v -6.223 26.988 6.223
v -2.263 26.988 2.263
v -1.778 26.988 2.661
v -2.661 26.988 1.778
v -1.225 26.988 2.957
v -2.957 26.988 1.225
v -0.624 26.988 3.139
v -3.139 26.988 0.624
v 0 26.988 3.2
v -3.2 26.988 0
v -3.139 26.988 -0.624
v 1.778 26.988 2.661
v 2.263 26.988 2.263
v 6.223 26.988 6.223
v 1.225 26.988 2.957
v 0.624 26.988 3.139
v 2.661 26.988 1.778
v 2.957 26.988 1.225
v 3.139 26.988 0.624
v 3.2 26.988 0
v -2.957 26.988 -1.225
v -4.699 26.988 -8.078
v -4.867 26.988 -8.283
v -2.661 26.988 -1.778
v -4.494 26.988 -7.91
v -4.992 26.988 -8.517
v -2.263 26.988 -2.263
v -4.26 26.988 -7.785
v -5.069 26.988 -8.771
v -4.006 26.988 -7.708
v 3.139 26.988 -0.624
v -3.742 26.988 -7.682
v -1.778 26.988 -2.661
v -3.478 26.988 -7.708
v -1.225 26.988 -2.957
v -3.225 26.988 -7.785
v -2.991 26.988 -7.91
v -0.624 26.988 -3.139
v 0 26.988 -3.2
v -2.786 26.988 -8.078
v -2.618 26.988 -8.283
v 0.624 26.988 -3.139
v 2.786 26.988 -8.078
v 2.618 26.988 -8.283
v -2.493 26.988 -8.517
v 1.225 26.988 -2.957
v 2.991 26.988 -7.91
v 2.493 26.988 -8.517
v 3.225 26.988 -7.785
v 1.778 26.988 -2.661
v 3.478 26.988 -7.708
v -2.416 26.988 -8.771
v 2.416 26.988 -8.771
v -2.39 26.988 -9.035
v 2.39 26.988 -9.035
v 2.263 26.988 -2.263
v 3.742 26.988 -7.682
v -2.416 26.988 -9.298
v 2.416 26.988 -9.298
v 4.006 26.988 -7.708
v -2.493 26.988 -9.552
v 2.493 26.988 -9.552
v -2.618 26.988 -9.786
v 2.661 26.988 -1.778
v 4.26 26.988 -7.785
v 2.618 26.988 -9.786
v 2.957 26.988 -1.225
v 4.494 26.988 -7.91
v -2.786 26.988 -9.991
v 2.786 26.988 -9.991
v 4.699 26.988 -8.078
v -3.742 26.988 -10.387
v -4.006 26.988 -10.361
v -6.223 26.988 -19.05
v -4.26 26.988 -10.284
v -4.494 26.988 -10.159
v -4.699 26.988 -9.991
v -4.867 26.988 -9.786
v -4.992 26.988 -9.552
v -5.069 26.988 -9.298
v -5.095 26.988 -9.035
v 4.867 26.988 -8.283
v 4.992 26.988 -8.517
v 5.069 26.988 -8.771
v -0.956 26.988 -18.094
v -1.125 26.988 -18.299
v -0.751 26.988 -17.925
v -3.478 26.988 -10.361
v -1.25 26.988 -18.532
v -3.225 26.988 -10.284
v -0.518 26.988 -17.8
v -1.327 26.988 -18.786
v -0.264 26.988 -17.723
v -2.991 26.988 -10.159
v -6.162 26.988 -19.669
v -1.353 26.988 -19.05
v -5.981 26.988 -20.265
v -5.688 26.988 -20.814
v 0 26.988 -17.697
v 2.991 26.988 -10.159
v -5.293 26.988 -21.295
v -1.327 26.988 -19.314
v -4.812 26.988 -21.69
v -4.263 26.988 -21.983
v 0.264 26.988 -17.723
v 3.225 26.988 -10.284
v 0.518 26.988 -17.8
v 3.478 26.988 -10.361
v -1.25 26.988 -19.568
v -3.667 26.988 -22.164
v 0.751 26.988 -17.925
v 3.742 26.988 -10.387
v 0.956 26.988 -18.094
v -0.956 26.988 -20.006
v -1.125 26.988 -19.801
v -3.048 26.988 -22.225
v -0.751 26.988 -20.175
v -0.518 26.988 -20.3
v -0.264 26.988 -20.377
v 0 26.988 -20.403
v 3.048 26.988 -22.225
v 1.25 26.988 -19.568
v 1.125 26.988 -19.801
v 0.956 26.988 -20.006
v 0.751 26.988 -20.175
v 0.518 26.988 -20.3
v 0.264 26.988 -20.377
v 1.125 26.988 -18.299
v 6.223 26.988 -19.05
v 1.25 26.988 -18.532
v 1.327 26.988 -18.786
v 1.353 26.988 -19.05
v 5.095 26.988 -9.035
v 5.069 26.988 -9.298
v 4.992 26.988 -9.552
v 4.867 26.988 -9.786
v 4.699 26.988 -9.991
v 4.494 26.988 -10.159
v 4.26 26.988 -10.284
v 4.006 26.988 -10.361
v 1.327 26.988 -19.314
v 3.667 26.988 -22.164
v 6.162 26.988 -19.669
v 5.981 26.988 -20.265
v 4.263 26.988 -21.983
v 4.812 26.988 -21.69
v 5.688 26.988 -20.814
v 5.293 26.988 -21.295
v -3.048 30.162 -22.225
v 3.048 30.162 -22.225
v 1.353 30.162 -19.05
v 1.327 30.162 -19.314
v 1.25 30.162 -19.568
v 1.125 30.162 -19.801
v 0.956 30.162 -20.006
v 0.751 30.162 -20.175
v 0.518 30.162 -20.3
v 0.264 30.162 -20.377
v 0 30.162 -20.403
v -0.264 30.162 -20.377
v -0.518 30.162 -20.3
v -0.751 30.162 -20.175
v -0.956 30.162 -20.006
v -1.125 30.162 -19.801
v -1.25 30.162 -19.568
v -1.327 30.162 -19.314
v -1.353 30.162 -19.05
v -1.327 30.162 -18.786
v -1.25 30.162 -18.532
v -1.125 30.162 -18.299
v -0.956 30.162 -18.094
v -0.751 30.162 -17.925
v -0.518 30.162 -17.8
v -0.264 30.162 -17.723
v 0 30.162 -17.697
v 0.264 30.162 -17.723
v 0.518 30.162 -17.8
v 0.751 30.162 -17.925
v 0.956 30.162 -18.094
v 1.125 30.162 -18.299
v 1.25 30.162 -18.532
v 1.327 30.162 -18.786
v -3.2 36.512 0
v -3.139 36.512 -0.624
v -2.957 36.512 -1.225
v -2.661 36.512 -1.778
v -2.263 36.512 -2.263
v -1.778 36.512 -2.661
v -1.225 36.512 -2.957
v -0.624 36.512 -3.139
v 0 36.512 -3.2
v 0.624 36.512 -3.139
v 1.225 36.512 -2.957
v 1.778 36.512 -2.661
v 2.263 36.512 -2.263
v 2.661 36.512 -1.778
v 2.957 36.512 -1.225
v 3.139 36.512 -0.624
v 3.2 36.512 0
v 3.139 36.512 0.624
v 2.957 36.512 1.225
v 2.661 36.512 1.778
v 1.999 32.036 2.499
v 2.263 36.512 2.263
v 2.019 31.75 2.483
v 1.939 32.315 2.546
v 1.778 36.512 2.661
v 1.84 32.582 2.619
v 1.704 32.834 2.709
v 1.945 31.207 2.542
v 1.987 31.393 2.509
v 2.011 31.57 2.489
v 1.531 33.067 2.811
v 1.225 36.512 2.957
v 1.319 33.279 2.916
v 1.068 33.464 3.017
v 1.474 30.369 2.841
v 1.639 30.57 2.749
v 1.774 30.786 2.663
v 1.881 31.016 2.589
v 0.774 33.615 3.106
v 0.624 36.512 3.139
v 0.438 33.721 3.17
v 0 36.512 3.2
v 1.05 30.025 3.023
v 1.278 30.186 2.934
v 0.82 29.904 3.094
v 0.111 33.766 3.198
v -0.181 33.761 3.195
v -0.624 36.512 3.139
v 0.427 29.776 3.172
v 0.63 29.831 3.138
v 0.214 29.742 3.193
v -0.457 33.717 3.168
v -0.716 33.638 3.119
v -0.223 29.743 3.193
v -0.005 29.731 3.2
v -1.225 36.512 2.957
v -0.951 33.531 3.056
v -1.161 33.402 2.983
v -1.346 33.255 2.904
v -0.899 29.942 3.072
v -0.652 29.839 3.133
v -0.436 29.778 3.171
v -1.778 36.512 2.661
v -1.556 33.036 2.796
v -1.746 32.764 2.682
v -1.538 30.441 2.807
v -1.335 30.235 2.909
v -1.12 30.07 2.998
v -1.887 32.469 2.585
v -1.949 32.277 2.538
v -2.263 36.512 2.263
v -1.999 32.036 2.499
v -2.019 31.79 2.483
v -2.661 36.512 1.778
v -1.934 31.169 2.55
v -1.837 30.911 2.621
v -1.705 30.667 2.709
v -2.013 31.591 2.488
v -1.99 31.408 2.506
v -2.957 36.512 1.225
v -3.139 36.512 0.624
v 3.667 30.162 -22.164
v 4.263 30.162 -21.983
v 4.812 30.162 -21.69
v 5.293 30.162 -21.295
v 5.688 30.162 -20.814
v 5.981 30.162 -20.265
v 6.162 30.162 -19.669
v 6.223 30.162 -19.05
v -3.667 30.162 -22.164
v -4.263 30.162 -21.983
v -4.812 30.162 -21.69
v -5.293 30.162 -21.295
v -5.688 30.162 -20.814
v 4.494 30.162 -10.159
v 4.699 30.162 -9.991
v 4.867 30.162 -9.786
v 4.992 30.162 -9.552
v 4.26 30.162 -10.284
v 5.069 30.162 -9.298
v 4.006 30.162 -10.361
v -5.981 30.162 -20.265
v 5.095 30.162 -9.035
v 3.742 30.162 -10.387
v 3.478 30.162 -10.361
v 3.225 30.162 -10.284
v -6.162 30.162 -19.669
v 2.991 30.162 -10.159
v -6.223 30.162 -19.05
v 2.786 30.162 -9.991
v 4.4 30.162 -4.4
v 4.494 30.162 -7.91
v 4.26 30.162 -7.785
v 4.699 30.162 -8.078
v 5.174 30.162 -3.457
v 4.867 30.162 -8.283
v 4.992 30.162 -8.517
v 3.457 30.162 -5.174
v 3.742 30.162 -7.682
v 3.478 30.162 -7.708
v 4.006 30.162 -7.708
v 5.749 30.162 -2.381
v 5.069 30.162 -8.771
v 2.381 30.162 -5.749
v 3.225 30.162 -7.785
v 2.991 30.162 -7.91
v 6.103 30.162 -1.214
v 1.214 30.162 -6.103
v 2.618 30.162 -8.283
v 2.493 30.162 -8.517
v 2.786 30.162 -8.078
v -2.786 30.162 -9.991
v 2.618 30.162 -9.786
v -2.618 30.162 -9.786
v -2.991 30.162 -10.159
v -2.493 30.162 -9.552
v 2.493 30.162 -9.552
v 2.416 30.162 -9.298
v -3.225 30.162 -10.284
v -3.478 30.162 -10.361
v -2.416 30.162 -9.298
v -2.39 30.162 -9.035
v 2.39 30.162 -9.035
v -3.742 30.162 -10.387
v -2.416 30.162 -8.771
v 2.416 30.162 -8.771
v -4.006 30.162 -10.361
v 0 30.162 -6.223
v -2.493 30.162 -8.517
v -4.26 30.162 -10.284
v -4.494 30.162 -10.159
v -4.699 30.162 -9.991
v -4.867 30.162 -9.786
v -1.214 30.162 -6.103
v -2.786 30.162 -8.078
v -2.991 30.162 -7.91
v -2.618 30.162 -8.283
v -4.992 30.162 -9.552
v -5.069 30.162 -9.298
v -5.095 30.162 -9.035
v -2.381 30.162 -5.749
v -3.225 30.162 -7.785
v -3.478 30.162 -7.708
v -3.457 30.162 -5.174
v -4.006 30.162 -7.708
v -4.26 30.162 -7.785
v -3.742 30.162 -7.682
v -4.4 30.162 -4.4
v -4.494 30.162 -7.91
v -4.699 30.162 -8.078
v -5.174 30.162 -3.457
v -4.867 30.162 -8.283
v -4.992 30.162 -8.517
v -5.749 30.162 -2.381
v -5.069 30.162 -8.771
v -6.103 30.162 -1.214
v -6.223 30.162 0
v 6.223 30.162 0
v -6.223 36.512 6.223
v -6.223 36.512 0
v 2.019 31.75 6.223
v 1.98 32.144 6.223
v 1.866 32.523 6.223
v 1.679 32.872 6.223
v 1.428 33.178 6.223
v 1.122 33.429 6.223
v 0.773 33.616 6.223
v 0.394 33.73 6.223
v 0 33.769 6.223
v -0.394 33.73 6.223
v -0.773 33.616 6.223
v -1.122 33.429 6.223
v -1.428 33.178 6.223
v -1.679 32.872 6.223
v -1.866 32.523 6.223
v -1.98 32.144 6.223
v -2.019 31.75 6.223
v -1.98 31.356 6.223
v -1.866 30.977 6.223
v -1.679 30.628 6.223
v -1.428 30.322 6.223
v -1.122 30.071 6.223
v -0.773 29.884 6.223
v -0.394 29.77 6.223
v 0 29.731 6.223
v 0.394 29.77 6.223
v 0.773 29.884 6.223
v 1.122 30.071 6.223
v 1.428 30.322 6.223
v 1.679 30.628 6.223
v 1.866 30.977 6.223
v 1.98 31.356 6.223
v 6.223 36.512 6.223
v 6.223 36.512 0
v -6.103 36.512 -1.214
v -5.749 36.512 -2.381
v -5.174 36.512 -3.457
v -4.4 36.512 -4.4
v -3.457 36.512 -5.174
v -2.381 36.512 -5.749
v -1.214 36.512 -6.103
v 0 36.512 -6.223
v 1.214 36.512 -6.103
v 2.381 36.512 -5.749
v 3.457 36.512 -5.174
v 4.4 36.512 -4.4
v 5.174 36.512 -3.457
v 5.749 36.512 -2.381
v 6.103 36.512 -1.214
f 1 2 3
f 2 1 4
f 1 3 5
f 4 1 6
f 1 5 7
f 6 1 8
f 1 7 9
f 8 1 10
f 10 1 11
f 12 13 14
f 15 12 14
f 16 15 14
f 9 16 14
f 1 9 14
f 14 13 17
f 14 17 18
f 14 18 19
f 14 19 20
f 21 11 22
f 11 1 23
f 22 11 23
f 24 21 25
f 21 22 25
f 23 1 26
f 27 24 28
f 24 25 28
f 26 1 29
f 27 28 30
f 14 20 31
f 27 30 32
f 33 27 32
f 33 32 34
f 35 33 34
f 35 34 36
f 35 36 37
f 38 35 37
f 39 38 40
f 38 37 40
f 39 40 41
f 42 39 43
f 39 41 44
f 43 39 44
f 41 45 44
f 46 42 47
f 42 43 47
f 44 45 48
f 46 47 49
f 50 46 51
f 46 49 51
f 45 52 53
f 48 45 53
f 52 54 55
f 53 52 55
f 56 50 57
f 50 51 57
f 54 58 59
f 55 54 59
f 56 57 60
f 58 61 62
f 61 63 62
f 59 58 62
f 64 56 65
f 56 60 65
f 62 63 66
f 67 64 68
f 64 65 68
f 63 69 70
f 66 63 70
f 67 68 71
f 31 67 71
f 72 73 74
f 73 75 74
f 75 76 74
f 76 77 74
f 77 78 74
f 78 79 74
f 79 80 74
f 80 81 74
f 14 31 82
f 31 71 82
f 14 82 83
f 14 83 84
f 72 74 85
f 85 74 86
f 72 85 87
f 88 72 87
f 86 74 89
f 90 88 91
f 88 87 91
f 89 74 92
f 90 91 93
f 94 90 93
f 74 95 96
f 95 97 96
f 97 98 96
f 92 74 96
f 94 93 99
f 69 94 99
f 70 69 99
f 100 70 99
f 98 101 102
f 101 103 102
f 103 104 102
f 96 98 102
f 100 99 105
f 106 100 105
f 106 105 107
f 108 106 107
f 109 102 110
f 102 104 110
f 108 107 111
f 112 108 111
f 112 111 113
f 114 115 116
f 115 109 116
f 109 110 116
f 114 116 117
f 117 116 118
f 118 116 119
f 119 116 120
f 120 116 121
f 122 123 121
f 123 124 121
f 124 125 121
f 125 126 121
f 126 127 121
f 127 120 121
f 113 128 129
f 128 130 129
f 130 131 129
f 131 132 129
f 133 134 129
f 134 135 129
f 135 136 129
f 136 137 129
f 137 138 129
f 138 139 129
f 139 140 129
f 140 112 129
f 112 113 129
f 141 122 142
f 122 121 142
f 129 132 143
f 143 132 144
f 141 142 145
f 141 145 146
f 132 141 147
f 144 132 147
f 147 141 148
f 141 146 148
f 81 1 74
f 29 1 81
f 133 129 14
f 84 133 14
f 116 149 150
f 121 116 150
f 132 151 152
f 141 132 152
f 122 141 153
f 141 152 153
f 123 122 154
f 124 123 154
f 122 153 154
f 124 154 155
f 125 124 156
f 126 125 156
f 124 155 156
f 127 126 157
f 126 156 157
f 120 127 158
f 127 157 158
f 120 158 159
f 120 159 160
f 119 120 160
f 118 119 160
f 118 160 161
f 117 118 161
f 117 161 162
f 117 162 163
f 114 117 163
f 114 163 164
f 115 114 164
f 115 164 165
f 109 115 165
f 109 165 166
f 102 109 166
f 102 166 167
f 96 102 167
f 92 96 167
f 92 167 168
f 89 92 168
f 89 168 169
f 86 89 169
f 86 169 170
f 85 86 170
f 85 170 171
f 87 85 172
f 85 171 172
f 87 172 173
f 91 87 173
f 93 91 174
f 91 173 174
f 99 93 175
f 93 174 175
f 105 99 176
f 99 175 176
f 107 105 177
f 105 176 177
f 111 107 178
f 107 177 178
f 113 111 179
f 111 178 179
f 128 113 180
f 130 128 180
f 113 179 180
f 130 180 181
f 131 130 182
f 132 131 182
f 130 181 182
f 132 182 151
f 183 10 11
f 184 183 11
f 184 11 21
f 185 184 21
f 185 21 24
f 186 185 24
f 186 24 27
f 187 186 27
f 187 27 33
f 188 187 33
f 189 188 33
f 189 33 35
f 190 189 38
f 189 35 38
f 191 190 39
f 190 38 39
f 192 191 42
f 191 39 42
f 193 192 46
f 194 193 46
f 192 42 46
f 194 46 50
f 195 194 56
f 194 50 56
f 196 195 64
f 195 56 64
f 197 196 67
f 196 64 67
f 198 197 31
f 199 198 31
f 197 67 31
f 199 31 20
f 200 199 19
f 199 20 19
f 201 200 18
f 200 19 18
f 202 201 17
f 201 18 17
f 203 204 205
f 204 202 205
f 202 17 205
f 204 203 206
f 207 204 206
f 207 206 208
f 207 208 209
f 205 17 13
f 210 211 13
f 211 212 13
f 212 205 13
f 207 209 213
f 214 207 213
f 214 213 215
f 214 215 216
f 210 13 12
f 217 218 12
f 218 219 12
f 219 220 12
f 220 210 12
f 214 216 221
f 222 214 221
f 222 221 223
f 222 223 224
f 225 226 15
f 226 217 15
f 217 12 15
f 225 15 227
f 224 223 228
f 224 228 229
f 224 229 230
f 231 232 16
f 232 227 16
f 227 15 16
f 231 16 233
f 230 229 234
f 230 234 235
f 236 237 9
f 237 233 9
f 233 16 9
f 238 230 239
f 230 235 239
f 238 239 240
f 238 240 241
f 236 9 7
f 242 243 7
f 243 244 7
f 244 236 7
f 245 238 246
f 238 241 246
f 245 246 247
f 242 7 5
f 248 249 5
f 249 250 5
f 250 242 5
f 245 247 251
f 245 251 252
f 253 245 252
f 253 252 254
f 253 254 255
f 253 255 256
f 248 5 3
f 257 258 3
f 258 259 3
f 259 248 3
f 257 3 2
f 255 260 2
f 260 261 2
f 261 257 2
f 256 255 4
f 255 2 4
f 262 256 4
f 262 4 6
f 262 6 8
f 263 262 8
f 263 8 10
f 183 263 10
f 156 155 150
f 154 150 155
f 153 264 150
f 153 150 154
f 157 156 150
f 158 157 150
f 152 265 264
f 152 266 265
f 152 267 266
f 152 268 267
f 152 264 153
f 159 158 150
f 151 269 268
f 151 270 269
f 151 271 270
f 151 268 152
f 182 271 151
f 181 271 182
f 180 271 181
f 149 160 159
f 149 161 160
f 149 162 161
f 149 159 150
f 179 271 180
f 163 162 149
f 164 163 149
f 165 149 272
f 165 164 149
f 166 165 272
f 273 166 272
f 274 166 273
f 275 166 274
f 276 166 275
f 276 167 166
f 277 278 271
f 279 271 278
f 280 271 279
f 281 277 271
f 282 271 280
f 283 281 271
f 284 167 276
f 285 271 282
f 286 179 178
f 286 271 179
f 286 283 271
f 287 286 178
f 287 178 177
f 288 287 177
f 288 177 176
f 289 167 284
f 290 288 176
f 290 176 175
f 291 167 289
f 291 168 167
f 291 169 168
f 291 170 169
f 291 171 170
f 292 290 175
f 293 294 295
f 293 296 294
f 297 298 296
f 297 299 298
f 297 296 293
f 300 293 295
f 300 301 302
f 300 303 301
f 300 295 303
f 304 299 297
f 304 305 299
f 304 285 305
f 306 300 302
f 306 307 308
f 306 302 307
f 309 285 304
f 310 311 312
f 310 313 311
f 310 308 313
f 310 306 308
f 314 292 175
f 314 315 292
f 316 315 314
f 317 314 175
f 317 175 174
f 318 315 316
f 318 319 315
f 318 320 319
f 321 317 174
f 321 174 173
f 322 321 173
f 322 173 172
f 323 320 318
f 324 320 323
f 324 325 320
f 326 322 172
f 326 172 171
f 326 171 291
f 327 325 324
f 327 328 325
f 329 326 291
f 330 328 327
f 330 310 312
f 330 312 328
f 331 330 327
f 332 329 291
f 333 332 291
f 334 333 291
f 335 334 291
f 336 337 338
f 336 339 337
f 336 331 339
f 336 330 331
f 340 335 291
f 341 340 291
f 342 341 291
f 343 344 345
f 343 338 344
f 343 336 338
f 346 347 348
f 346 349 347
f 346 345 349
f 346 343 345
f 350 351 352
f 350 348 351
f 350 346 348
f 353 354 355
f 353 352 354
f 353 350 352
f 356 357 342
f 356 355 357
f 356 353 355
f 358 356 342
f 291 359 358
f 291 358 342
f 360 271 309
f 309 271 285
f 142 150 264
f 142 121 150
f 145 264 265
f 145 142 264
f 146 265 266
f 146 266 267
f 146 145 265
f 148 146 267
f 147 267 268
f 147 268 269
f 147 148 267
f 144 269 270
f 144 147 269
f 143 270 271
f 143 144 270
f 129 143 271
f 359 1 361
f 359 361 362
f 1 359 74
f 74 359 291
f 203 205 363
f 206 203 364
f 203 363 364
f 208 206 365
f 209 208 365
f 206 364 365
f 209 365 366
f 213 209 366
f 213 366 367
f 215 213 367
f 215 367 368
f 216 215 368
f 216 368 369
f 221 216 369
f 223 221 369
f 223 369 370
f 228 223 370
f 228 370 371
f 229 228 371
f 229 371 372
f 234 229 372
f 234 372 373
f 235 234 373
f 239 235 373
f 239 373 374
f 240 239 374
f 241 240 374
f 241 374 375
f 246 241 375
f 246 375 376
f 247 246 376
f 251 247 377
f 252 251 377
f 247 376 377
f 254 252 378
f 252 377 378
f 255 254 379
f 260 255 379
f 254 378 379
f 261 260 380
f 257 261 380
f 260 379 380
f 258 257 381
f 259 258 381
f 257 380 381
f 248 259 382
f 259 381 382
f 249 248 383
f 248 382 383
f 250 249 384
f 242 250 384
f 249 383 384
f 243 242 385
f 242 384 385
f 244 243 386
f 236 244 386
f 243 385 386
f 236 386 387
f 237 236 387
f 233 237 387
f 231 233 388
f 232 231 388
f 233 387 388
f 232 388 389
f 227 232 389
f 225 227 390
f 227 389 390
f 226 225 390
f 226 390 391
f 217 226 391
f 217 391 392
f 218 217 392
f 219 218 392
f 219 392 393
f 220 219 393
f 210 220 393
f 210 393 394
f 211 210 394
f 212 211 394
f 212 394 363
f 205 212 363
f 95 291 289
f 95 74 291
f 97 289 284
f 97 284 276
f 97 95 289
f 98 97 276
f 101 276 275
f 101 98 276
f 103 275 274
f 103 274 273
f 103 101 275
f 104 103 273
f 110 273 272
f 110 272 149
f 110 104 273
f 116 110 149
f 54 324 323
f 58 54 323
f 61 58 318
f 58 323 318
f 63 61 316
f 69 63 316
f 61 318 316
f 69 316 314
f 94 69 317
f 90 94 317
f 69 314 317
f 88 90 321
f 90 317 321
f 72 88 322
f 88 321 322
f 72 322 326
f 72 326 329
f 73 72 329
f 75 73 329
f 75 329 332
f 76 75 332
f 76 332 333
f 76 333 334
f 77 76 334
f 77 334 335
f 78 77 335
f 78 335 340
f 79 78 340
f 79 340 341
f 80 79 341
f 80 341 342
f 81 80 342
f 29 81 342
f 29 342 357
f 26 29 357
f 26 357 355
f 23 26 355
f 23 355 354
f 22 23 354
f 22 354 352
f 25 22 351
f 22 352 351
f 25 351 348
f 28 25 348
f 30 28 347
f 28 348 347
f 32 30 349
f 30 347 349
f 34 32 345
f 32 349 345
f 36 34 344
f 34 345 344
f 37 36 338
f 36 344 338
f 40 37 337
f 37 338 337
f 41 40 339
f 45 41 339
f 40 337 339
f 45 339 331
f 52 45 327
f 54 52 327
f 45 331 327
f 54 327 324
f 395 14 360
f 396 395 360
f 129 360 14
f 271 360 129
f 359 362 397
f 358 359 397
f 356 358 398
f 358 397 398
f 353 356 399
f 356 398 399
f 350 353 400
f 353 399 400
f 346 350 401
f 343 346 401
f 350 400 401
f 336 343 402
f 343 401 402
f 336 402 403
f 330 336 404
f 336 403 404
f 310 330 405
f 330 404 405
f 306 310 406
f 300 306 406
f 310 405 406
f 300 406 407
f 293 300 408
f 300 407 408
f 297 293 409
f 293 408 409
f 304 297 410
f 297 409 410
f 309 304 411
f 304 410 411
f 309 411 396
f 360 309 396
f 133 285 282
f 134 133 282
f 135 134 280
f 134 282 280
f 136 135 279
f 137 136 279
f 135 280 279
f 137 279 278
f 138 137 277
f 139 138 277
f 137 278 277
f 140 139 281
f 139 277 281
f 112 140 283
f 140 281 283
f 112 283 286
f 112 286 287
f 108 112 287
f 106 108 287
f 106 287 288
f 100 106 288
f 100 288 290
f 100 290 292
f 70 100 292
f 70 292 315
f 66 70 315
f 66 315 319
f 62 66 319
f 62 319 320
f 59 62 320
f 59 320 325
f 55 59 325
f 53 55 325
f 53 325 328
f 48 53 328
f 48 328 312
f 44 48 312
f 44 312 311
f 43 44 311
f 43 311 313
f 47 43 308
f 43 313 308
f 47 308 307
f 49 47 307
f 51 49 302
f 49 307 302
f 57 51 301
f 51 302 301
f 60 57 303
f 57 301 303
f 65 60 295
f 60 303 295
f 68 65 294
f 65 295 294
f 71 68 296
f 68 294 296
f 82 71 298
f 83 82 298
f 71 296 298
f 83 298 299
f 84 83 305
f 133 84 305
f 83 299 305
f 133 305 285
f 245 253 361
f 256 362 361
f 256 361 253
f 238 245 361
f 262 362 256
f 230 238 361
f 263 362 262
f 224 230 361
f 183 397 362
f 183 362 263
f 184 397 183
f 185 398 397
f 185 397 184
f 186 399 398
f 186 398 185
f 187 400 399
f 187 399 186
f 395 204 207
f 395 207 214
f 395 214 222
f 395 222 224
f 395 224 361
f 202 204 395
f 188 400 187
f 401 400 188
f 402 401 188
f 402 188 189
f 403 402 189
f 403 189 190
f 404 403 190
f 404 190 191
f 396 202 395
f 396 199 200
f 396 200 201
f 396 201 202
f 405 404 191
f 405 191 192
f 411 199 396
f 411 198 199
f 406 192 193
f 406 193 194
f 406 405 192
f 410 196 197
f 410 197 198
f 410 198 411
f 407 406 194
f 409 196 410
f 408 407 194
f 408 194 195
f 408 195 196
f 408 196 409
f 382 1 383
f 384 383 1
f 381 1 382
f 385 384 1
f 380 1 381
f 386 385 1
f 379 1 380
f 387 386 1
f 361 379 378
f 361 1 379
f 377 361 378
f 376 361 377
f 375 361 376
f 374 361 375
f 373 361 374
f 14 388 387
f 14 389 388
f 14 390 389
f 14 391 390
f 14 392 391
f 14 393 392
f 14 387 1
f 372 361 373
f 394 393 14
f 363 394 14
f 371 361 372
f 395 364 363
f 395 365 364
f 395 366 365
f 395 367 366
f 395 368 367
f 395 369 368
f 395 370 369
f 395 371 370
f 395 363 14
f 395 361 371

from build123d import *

# Parameters (mm, degrees)
SKETCH_1_W                = 12.446
SKETCH_1_H                = 28.448
EXTRUDE_1_DEPTH           = 9.525
CUT_EXTRUDE_1_DEPTH       = 6.35
HOLE_WIZARD_M2_5_1_D      = 2.7051
HOLE_WIZARD_M2_5_1_DEPTH  = 9.525
HOLE_WIZARD_M6_1_D        = 6.4008
HOLE_WIZARD_M3_5_1_REACH  = 48.703
HOLE_WIZARD_M3_5_1_BORE_R = 2.0193
FILLET_1_R                = 3.175


with BuildPart() as part:
    # 草图1 → 凸台-拉伸1 (new body)
    with BuildSketch(Plane(origin=(0, 36.5125, 0), x_dir=(1, 0, 0), z_dir=(0, 1, 0))):
        with Locations((0, 8.001)):
            Rectangle(SKETCH_1_W, SKETCH_1_H)
    extrude(amount=-EXTRUDE_1_DEPTH)

    # 草图2 → 切除-拉伸1 (cut)
    with BuildSketch(Plane(origin=(0, 36.5125, 0), x_dir=(-1, 0, 0), z_dir=(0, 1, 0))):
        with BuildLine():
            Line((6.223, -22.225), (6.223, 0))
            ThreePointArc((6.223, 0), (0, -6.223), (-6.223, 0))
            Line((-6.223, 0), (-6.223, -22.225))
            Line((-6.223, -22.225), (6.223, -22.225))
        make_face()
    extrude(amount=-CUT_EXTRUDE_1_DEPTH, mode=Mode.SUBTRACT)

    # M2.5 间隙孔1
    with Locations(Plane(origin=(0, 26.9875, 0), x_dir=(-1, 0, 0), z_dir=(0, -1, 0))):
        with Locations((-3.742261285, 9.034617948), (3.742261285, 9.034617948), (0, 19.05)):
            Hole(HOLE_WIZARD_M2_5_1_D / 2, depth=HOLE_WIZARD_M2_5_1_DEPTH)

    # M6 间隙孔1 (through all)
    with Locations(Plane(origin=(0, 36.5125, 0), x_dir=(1, 0, 0), z_dir=(0, 1, 0))):
        with Locations((0, 0)):
            Hole(HOLE_WIZARD_M6_1_D / 2)

    # M3.5 间隙孔1 bore → M3.5 间隙孔1 (cut, up to next)
    with BuildSketch(Plane.XY.offset(6.223), mode=Mode.PRIVATE) as hole_wizard_m3_5_1_sk1:
        with Locations((0, 31.75)):
            Circle(HOLE_WIZARD_M3_5_1_BORE_R)
    hole_wizard_m3_5_1_tool1 = extrude(hole_wizard_m3_5_1_sk1.sketch, amount=-HOLE_WIZARD_M3_5_1_REACH, mode=Mode.PRIVATE) & part.part
    add(hole_wizard_m3_5_1_tool1.solids().sort_by_distance((0, 31.75, 6.223))[0], mode=Mode.SUBTRACT)

    # 圆角1
    fillet_1_edges = [part.edges().sort_by_distance(p)[0] for p in [
        (-6.223, 28.575, -22.225),
        (6.223, 28.575, -22.225),
    ]]
    fillet(fillet_1_edges, radius=FILLET_1_R)


solid = part.part
